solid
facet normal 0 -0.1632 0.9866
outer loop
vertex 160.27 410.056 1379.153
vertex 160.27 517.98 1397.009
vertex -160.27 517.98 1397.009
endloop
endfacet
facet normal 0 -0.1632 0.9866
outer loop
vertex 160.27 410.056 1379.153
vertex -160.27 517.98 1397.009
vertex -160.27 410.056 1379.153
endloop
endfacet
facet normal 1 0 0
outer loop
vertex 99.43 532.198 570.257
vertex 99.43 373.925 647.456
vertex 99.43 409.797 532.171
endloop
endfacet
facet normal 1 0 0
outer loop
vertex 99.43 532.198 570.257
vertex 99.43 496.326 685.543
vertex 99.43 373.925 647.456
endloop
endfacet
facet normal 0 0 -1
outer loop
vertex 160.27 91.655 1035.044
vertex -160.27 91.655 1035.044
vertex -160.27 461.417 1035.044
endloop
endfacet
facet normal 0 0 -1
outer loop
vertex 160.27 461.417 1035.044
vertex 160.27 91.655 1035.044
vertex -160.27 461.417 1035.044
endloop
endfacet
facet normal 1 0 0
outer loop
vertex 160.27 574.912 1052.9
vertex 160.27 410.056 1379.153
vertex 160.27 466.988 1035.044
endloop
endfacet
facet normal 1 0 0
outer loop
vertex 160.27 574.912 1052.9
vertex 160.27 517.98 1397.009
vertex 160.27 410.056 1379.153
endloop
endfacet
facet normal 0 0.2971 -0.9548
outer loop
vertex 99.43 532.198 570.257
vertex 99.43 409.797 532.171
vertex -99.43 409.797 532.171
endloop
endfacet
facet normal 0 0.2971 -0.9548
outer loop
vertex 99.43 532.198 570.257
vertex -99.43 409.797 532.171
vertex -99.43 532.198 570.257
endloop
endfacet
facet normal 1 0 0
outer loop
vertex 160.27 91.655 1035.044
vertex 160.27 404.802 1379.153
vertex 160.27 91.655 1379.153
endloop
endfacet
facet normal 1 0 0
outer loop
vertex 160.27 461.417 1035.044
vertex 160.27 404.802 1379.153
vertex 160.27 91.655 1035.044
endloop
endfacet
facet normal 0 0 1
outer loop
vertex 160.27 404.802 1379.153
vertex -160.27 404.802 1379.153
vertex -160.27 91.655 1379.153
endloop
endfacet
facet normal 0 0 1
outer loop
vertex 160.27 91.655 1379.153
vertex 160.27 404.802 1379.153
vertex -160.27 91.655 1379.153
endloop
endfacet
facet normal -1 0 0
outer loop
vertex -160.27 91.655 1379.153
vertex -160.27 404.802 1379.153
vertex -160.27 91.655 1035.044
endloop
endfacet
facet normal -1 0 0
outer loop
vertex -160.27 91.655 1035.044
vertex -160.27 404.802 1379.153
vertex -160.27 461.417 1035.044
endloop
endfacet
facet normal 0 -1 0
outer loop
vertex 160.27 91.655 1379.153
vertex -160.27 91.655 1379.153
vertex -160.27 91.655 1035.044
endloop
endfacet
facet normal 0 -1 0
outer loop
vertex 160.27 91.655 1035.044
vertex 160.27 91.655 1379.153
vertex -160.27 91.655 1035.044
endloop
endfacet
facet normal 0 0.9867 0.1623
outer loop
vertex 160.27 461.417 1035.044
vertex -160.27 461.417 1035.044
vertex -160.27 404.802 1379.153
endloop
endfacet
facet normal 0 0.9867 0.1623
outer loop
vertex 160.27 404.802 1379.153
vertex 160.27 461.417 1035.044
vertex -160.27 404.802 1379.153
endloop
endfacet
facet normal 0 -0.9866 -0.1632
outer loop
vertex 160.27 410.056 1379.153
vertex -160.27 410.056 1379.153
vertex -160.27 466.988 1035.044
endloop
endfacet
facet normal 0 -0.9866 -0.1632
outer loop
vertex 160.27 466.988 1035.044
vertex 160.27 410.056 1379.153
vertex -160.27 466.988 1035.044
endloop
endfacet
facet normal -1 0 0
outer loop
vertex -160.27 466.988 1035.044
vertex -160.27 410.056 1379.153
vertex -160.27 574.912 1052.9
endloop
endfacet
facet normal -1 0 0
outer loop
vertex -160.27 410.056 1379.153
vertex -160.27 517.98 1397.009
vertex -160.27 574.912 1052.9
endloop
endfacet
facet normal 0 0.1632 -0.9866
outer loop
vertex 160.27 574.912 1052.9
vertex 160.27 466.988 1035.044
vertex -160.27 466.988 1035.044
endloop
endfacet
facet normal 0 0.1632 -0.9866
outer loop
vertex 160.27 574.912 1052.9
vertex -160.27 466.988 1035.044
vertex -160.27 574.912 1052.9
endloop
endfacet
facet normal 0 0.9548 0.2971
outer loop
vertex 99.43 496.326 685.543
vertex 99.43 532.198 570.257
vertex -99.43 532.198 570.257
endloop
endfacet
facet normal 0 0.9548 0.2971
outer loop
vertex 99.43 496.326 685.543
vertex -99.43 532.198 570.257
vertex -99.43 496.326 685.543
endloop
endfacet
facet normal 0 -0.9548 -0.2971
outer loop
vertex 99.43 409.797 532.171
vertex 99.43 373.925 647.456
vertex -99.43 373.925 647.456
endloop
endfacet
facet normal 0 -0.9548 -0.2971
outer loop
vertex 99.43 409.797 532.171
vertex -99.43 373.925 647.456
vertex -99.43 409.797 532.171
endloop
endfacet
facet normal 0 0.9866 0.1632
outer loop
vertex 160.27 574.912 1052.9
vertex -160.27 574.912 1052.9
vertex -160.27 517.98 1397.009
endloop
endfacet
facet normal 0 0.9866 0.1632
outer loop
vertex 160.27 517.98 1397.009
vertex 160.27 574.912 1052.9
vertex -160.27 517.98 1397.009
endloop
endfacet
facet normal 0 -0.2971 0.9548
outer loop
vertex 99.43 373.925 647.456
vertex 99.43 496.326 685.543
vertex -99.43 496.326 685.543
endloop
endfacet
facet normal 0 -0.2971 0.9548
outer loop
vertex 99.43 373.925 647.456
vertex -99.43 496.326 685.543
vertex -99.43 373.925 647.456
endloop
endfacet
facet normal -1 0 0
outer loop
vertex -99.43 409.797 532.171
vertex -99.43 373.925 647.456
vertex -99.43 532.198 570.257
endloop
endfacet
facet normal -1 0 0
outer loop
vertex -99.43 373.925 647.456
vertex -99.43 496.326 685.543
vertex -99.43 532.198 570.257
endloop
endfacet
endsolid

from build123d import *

# Parameters (mm, degrees)
BOSS_EXTRUDE1_START = -160.270086
BOSS_EXTRUDE1_DEPTH = 320.540172
BOSS_EXTRUDE2_START = -160.270086
BOSS_EXTRUDE2_DEPTH = 320.540172
BOSS_EXTRUDE3_START = 99.430357
BOSS_EXTRUDE3_DEPTH = 198.860714


with BuildPart() as part:
    # Sketch2 → Boss-Extrude1 (new body)
    with BuildSketch(Plane(origin=(0, 0, 0), x_dir=(0, 0, -1), z_dir=(1, 0, 0)).offset(BOSS_EXTRUDE1_START)):
        Polygon((-1035.044323606, 461.416773344), (-1379.153061364, 404.802482299), (-1379.153061364, 91.654684957), (-1035.044323606, 91.654684957), align=None)
    extrude(amount=BOSS_EXTRUDE1_DEPTH)


with BuildPart() as body_2:
    # Sketch3 → Boss-Extrude2 (new body)
    with BuildSketch(Plane(origin=(0, 0, 0), x_dir=(0, 0, -1), z_dir=(1, 0, 0)).offset(BOSS_EXTRUDE2_START)):
        Polygon((-1379.153061364, 410.05637394), (-1035.044323606, 466.987725211), (-1052.899911105, 574.91180463), (-1397.008648862, 517.980453359), align=None)
    extrude(amount=BOSS_EXTRUDE2_DEPTH)


with BuildPart() as body_3:
    # Sketch4 → Boss-Extrude3 (new body)
    with BuildSketch(Plane(origin=(0, 0, 0), x_dir=(0, 0, -1), z_dir=(1, 0, 0)).offset(BOSS_EXTRUDE3_START)):
        Polygon((-647.4564319, 373.924864574), (-532.171112015, 409.797007159), (-570.257367388, 532.19800742), (-685.542687273, 496.325864836), align=None)
    extrude(amount=-BOSS_EXTRUDE3_DEPTH)


solid = Compound([part.part, body_2.part, body_3.part])
